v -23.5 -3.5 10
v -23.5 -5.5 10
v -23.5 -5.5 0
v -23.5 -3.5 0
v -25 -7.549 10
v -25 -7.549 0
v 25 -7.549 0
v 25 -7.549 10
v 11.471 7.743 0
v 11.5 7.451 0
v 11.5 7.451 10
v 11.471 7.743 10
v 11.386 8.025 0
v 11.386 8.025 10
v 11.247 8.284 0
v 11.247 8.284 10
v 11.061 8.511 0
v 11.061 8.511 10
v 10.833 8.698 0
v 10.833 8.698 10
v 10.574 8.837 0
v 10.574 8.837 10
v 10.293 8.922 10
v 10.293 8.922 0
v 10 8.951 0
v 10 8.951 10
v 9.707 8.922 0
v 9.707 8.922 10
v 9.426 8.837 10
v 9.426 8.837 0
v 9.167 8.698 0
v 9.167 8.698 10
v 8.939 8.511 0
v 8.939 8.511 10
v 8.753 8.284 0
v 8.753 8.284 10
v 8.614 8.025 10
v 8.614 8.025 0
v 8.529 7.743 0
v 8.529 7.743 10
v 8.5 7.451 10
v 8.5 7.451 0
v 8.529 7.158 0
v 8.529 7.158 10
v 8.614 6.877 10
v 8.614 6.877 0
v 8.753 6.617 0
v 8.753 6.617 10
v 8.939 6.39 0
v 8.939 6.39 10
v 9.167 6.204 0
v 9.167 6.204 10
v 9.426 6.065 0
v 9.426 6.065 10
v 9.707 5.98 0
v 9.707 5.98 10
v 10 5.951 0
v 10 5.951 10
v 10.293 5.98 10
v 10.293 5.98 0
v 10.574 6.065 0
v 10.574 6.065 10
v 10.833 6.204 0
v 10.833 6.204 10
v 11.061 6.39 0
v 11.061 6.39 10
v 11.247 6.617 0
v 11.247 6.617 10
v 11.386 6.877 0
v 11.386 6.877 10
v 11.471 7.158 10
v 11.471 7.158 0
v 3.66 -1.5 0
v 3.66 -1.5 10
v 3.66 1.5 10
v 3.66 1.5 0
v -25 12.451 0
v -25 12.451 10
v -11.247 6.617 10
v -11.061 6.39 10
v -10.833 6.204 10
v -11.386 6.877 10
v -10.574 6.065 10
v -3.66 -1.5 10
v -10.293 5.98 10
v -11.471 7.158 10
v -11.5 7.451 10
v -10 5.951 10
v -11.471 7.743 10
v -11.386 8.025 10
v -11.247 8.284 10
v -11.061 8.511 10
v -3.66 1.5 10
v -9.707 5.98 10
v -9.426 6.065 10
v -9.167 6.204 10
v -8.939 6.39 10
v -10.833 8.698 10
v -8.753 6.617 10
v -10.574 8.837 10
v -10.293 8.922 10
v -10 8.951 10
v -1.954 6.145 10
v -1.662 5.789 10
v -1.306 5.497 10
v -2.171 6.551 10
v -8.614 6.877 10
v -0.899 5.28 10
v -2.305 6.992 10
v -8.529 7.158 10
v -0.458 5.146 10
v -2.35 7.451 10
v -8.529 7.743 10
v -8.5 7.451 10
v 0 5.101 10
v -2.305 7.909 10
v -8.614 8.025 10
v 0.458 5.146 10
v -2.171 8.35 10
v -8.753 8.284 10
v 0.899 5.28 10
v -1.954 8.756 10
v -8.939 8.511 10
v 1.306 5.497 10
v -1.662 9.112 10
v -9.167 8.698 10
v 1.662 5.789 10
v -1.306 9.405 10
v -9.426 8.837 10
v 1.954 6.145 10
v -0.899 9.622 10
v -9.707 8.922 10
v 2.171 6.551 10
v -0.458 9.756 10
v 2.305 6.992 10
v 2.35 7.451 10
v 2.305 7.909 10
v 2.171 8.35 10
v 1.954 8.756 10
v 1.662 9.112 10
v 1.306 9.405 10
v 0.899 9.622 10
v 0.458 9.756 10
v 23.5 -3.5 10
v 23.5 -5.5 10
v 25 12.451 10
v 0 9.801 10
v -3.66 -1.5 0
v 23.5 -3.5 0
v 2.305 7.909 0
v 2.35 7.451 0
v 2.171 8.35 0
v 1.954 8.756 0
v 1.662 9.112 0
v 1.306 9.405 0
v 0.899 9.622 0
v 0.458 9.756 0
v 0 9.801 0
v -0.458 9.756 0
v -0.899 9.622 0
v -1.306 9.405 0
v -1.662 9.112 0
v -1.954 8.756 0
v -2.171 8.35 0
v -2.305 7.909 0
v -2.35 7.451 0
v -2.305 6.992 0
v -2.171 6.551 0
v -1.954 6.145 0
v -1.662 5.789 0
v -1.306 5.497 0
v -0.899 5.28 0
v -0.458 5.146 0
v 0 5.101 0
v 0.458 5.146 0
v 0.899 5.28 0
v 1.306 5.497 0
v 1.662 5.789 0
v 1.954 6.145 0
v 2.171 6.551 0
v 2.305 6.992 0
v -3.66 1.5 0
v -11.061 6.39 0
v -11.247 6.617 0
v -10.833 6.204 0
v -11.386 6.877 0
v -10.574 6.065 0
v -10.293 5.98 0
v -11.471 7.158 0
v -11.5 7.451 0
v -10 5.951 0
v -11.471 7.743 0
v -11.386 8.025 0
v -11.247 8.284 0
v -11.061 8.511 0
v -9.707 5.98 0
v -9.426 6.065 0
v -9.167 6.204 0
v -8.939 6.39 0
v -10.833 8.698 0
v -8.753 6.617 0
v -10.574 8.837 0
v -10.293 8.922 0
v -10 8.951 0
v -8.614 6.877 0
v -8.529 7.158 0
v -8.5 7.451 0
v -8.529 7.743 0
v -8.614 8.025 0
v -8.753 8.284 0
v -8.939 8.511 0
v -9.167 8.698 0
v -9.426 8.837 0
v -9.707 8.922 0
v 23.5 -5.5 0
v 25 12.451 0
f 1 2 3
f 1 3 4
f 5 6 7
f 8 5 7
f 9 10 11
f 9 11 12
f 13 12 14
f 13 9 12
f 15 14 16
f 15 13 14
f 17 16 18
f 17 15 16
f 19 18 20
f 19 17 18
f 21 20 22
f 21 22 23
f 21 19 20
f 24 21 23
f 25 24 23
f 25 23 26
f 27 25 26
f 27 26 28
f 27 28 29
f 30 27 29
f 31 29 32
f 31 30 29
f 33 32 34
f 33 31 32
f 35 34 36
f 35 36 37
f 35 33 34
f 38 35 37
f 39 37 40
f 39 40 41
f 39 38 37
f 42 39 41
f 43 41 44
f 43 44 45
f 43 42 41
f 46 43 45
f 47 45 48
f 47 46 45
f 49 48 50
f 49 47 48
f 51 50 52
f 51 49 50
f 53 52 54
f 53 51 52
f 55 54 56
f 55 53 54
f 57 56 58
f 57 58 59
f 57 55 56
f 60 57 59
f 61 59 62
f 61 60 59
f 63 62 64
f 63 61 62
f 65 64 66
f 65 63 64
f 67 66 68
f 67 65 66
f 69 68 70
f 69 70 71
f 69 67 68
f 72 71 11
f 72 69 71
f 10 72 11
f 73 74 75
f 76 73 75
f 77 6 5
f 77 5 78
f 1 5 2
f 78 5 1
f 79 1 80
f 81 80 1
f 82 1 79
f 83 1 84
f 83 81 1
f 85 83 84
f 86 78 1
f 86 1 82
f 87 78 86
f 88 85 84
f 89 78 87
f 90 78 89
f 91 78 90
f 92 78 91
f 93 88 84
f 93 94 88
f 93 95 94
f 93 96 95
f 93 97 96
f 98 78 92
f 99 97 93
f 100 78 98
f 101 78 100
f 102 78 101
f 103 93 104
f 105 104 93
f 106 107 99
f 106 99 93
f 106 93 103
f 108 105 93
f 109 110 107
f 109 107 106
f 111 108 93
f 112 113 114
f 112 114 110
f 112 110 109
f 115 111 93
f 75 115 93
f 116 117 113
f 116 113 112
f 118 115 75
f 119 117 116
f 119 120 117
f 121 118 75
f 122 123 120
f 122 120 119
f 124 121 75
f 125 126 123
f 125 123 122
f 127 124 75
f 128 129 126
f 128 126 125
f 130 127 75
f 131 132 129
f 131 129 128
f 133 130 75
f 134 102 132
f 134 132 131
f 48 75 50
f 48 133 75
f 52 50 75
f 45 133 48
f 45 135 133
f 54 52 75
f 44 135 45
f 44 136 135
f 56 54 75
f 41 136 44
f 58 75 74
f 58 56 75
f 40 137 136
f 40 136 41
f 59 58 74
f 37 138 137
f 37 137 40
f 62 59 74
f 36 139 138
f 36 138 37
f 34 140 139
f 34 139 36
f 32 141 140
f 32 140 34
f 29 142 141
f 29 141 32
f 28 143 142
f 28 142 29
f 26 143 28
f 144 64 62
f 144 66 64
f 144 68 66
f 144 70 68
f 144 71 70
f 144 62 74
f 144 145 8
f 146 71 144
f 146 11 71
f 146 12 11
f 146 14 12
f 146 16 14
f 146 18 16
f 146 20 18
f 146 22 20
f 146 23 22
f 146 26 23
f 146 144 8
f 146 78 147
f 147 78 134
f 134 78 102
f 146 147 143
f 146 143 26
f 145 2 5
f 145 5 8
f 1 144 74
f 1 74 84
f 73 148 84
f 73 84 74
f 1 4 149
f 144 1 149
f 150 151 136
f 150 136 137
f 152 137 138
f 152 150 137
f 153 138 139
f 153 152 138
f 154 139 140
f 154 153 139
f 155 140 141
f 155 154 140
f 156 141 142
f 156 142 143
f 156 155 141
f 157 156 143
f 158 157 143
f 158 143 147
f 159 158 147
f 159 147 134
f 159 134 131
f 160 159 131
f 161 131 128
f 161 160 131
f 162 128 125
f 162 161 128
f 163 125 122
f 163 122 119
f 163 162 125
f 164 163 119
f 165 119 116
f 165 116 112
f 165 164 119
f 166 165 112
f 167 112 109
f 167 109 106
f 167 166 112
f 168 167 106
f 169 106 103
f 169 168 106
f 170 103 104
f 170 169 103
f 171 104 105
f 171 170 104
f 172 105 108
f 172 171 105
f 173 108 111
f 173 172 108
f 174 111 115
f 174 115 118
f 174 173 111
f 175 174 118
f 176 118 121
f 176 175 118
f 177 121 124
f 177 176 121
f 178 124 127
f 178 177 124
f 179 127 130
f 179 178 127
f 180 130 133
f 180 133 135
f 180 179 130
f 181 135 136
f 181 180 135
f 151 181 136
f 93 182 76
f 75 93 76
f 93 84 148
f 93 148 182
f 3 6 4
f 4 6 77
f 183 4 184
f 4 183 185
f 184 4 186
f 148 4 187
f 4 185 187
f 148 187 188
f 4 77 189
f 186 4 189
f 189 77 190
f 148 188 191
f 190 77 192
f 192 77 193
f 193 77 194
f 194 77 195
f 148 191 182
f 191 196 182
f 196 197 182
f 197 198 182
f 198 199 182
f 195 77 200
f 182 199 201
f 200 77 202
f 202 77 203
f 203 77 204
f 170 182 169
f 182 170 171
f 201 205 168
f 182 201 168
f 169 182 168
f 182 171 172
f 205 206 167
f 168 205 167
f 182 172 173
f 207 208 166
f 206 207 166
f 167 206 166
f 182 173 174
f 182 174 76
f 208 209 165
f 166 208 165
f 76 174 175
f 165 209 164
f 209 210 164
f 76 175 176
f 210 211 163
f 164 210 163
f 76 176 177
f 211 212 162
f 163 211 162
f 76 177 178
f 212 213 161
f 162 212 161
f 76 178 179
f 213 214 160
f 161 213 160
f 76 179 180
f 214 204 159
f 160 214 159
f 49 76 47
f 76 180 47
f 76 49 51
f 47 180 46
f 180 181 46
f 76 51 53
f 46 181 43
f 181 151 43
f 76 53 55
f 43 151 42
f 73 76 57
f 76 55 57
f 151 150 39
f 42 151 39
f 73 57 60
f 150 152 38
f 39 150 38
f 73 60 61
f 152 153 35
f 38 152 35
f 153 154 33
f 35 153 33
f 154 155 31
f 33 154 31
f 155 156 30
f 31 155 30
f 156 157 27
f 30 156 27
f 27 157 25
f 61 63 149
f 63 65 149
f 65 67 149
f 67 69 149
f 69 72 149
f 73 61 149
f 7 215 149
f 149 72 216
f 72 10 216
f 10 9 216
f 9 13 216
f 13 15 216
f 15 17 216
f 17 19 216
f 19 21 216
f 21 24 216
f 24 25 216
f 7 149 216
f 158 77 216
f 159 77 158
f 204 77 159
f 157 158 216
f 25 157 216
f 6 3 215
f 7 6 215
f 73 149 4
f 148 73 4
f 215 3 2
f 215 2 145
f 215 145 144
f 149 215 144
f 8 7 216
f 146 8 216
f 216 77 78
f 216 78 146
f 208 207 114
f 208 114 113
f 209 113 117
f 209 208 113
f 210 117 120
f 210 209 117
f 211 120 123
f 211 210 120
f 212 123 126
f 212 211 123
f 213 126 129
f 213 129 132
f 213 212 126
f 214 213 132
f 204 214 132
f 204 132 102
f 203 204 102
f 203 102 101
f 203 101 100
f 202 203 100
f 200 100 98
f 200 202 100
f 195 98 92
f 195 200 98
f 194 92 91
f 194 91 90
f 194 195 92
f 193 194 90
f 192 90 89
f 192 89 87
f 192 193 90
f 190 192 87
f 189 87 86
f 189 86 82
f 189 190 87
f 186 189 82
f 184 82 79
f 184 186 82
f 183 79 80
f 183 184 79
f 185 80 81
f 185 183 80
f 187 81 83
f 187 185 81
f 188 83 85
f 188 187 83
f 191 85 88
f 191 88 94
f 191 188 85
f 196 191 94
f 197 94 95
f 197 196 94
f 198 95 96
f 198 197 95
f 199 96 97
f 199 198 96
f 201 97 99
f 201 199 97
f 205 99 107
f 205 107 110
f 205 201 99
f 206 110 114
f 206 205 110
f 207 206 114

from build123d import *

# Parameters (mm, degrees)
SKETCH1_W           = 50
SKETCH1_H           = 20
SKETCH1_R           = 1.5
SKETCH1_R_2         = 2.35
SKETCH1_W_2         = 7.32
SKETCH1_H_2         = 3
SKETCH1_W_3         = 47
SKETCH1_H_3         = 2
BOSS_EXTRUDE1_DEPTH = 10


with BuildPart() as part:
    # Sketch1 → Boss-Extrude1 (new body)
    with BuildSketch(Plane.XY):
        with Locations((0, 2.450714286)):
            Rectangle(SKETCH1_W, SKETCH1_H)
        with Locations((-10, 7.450714286)):
            Circle(SKETCH1_R, mode=Mode.SUBTRACT)
        with Locations((10, 7.450714286)):
            Circle(SKETCH1_R, mode=Mode.SUBTRACT)
        with Locations((0, 7.450714286)):
            Circle(SKETCH1_R_2, mode=Mode.SUBTRACT)
        Rectangle(SKETCH1_W_2, SKETCH1_H_2, mode=Mode.SUBTRACT)
        with Locations((0, -4.5)):
            Rectangle(SKETCH1_W_3, SKETCH1_H_3, mode=Mode.SUBTRACT)
    extrude(amount=BOSS_EXTRUDE1_DEPTH)


solid = part.part
